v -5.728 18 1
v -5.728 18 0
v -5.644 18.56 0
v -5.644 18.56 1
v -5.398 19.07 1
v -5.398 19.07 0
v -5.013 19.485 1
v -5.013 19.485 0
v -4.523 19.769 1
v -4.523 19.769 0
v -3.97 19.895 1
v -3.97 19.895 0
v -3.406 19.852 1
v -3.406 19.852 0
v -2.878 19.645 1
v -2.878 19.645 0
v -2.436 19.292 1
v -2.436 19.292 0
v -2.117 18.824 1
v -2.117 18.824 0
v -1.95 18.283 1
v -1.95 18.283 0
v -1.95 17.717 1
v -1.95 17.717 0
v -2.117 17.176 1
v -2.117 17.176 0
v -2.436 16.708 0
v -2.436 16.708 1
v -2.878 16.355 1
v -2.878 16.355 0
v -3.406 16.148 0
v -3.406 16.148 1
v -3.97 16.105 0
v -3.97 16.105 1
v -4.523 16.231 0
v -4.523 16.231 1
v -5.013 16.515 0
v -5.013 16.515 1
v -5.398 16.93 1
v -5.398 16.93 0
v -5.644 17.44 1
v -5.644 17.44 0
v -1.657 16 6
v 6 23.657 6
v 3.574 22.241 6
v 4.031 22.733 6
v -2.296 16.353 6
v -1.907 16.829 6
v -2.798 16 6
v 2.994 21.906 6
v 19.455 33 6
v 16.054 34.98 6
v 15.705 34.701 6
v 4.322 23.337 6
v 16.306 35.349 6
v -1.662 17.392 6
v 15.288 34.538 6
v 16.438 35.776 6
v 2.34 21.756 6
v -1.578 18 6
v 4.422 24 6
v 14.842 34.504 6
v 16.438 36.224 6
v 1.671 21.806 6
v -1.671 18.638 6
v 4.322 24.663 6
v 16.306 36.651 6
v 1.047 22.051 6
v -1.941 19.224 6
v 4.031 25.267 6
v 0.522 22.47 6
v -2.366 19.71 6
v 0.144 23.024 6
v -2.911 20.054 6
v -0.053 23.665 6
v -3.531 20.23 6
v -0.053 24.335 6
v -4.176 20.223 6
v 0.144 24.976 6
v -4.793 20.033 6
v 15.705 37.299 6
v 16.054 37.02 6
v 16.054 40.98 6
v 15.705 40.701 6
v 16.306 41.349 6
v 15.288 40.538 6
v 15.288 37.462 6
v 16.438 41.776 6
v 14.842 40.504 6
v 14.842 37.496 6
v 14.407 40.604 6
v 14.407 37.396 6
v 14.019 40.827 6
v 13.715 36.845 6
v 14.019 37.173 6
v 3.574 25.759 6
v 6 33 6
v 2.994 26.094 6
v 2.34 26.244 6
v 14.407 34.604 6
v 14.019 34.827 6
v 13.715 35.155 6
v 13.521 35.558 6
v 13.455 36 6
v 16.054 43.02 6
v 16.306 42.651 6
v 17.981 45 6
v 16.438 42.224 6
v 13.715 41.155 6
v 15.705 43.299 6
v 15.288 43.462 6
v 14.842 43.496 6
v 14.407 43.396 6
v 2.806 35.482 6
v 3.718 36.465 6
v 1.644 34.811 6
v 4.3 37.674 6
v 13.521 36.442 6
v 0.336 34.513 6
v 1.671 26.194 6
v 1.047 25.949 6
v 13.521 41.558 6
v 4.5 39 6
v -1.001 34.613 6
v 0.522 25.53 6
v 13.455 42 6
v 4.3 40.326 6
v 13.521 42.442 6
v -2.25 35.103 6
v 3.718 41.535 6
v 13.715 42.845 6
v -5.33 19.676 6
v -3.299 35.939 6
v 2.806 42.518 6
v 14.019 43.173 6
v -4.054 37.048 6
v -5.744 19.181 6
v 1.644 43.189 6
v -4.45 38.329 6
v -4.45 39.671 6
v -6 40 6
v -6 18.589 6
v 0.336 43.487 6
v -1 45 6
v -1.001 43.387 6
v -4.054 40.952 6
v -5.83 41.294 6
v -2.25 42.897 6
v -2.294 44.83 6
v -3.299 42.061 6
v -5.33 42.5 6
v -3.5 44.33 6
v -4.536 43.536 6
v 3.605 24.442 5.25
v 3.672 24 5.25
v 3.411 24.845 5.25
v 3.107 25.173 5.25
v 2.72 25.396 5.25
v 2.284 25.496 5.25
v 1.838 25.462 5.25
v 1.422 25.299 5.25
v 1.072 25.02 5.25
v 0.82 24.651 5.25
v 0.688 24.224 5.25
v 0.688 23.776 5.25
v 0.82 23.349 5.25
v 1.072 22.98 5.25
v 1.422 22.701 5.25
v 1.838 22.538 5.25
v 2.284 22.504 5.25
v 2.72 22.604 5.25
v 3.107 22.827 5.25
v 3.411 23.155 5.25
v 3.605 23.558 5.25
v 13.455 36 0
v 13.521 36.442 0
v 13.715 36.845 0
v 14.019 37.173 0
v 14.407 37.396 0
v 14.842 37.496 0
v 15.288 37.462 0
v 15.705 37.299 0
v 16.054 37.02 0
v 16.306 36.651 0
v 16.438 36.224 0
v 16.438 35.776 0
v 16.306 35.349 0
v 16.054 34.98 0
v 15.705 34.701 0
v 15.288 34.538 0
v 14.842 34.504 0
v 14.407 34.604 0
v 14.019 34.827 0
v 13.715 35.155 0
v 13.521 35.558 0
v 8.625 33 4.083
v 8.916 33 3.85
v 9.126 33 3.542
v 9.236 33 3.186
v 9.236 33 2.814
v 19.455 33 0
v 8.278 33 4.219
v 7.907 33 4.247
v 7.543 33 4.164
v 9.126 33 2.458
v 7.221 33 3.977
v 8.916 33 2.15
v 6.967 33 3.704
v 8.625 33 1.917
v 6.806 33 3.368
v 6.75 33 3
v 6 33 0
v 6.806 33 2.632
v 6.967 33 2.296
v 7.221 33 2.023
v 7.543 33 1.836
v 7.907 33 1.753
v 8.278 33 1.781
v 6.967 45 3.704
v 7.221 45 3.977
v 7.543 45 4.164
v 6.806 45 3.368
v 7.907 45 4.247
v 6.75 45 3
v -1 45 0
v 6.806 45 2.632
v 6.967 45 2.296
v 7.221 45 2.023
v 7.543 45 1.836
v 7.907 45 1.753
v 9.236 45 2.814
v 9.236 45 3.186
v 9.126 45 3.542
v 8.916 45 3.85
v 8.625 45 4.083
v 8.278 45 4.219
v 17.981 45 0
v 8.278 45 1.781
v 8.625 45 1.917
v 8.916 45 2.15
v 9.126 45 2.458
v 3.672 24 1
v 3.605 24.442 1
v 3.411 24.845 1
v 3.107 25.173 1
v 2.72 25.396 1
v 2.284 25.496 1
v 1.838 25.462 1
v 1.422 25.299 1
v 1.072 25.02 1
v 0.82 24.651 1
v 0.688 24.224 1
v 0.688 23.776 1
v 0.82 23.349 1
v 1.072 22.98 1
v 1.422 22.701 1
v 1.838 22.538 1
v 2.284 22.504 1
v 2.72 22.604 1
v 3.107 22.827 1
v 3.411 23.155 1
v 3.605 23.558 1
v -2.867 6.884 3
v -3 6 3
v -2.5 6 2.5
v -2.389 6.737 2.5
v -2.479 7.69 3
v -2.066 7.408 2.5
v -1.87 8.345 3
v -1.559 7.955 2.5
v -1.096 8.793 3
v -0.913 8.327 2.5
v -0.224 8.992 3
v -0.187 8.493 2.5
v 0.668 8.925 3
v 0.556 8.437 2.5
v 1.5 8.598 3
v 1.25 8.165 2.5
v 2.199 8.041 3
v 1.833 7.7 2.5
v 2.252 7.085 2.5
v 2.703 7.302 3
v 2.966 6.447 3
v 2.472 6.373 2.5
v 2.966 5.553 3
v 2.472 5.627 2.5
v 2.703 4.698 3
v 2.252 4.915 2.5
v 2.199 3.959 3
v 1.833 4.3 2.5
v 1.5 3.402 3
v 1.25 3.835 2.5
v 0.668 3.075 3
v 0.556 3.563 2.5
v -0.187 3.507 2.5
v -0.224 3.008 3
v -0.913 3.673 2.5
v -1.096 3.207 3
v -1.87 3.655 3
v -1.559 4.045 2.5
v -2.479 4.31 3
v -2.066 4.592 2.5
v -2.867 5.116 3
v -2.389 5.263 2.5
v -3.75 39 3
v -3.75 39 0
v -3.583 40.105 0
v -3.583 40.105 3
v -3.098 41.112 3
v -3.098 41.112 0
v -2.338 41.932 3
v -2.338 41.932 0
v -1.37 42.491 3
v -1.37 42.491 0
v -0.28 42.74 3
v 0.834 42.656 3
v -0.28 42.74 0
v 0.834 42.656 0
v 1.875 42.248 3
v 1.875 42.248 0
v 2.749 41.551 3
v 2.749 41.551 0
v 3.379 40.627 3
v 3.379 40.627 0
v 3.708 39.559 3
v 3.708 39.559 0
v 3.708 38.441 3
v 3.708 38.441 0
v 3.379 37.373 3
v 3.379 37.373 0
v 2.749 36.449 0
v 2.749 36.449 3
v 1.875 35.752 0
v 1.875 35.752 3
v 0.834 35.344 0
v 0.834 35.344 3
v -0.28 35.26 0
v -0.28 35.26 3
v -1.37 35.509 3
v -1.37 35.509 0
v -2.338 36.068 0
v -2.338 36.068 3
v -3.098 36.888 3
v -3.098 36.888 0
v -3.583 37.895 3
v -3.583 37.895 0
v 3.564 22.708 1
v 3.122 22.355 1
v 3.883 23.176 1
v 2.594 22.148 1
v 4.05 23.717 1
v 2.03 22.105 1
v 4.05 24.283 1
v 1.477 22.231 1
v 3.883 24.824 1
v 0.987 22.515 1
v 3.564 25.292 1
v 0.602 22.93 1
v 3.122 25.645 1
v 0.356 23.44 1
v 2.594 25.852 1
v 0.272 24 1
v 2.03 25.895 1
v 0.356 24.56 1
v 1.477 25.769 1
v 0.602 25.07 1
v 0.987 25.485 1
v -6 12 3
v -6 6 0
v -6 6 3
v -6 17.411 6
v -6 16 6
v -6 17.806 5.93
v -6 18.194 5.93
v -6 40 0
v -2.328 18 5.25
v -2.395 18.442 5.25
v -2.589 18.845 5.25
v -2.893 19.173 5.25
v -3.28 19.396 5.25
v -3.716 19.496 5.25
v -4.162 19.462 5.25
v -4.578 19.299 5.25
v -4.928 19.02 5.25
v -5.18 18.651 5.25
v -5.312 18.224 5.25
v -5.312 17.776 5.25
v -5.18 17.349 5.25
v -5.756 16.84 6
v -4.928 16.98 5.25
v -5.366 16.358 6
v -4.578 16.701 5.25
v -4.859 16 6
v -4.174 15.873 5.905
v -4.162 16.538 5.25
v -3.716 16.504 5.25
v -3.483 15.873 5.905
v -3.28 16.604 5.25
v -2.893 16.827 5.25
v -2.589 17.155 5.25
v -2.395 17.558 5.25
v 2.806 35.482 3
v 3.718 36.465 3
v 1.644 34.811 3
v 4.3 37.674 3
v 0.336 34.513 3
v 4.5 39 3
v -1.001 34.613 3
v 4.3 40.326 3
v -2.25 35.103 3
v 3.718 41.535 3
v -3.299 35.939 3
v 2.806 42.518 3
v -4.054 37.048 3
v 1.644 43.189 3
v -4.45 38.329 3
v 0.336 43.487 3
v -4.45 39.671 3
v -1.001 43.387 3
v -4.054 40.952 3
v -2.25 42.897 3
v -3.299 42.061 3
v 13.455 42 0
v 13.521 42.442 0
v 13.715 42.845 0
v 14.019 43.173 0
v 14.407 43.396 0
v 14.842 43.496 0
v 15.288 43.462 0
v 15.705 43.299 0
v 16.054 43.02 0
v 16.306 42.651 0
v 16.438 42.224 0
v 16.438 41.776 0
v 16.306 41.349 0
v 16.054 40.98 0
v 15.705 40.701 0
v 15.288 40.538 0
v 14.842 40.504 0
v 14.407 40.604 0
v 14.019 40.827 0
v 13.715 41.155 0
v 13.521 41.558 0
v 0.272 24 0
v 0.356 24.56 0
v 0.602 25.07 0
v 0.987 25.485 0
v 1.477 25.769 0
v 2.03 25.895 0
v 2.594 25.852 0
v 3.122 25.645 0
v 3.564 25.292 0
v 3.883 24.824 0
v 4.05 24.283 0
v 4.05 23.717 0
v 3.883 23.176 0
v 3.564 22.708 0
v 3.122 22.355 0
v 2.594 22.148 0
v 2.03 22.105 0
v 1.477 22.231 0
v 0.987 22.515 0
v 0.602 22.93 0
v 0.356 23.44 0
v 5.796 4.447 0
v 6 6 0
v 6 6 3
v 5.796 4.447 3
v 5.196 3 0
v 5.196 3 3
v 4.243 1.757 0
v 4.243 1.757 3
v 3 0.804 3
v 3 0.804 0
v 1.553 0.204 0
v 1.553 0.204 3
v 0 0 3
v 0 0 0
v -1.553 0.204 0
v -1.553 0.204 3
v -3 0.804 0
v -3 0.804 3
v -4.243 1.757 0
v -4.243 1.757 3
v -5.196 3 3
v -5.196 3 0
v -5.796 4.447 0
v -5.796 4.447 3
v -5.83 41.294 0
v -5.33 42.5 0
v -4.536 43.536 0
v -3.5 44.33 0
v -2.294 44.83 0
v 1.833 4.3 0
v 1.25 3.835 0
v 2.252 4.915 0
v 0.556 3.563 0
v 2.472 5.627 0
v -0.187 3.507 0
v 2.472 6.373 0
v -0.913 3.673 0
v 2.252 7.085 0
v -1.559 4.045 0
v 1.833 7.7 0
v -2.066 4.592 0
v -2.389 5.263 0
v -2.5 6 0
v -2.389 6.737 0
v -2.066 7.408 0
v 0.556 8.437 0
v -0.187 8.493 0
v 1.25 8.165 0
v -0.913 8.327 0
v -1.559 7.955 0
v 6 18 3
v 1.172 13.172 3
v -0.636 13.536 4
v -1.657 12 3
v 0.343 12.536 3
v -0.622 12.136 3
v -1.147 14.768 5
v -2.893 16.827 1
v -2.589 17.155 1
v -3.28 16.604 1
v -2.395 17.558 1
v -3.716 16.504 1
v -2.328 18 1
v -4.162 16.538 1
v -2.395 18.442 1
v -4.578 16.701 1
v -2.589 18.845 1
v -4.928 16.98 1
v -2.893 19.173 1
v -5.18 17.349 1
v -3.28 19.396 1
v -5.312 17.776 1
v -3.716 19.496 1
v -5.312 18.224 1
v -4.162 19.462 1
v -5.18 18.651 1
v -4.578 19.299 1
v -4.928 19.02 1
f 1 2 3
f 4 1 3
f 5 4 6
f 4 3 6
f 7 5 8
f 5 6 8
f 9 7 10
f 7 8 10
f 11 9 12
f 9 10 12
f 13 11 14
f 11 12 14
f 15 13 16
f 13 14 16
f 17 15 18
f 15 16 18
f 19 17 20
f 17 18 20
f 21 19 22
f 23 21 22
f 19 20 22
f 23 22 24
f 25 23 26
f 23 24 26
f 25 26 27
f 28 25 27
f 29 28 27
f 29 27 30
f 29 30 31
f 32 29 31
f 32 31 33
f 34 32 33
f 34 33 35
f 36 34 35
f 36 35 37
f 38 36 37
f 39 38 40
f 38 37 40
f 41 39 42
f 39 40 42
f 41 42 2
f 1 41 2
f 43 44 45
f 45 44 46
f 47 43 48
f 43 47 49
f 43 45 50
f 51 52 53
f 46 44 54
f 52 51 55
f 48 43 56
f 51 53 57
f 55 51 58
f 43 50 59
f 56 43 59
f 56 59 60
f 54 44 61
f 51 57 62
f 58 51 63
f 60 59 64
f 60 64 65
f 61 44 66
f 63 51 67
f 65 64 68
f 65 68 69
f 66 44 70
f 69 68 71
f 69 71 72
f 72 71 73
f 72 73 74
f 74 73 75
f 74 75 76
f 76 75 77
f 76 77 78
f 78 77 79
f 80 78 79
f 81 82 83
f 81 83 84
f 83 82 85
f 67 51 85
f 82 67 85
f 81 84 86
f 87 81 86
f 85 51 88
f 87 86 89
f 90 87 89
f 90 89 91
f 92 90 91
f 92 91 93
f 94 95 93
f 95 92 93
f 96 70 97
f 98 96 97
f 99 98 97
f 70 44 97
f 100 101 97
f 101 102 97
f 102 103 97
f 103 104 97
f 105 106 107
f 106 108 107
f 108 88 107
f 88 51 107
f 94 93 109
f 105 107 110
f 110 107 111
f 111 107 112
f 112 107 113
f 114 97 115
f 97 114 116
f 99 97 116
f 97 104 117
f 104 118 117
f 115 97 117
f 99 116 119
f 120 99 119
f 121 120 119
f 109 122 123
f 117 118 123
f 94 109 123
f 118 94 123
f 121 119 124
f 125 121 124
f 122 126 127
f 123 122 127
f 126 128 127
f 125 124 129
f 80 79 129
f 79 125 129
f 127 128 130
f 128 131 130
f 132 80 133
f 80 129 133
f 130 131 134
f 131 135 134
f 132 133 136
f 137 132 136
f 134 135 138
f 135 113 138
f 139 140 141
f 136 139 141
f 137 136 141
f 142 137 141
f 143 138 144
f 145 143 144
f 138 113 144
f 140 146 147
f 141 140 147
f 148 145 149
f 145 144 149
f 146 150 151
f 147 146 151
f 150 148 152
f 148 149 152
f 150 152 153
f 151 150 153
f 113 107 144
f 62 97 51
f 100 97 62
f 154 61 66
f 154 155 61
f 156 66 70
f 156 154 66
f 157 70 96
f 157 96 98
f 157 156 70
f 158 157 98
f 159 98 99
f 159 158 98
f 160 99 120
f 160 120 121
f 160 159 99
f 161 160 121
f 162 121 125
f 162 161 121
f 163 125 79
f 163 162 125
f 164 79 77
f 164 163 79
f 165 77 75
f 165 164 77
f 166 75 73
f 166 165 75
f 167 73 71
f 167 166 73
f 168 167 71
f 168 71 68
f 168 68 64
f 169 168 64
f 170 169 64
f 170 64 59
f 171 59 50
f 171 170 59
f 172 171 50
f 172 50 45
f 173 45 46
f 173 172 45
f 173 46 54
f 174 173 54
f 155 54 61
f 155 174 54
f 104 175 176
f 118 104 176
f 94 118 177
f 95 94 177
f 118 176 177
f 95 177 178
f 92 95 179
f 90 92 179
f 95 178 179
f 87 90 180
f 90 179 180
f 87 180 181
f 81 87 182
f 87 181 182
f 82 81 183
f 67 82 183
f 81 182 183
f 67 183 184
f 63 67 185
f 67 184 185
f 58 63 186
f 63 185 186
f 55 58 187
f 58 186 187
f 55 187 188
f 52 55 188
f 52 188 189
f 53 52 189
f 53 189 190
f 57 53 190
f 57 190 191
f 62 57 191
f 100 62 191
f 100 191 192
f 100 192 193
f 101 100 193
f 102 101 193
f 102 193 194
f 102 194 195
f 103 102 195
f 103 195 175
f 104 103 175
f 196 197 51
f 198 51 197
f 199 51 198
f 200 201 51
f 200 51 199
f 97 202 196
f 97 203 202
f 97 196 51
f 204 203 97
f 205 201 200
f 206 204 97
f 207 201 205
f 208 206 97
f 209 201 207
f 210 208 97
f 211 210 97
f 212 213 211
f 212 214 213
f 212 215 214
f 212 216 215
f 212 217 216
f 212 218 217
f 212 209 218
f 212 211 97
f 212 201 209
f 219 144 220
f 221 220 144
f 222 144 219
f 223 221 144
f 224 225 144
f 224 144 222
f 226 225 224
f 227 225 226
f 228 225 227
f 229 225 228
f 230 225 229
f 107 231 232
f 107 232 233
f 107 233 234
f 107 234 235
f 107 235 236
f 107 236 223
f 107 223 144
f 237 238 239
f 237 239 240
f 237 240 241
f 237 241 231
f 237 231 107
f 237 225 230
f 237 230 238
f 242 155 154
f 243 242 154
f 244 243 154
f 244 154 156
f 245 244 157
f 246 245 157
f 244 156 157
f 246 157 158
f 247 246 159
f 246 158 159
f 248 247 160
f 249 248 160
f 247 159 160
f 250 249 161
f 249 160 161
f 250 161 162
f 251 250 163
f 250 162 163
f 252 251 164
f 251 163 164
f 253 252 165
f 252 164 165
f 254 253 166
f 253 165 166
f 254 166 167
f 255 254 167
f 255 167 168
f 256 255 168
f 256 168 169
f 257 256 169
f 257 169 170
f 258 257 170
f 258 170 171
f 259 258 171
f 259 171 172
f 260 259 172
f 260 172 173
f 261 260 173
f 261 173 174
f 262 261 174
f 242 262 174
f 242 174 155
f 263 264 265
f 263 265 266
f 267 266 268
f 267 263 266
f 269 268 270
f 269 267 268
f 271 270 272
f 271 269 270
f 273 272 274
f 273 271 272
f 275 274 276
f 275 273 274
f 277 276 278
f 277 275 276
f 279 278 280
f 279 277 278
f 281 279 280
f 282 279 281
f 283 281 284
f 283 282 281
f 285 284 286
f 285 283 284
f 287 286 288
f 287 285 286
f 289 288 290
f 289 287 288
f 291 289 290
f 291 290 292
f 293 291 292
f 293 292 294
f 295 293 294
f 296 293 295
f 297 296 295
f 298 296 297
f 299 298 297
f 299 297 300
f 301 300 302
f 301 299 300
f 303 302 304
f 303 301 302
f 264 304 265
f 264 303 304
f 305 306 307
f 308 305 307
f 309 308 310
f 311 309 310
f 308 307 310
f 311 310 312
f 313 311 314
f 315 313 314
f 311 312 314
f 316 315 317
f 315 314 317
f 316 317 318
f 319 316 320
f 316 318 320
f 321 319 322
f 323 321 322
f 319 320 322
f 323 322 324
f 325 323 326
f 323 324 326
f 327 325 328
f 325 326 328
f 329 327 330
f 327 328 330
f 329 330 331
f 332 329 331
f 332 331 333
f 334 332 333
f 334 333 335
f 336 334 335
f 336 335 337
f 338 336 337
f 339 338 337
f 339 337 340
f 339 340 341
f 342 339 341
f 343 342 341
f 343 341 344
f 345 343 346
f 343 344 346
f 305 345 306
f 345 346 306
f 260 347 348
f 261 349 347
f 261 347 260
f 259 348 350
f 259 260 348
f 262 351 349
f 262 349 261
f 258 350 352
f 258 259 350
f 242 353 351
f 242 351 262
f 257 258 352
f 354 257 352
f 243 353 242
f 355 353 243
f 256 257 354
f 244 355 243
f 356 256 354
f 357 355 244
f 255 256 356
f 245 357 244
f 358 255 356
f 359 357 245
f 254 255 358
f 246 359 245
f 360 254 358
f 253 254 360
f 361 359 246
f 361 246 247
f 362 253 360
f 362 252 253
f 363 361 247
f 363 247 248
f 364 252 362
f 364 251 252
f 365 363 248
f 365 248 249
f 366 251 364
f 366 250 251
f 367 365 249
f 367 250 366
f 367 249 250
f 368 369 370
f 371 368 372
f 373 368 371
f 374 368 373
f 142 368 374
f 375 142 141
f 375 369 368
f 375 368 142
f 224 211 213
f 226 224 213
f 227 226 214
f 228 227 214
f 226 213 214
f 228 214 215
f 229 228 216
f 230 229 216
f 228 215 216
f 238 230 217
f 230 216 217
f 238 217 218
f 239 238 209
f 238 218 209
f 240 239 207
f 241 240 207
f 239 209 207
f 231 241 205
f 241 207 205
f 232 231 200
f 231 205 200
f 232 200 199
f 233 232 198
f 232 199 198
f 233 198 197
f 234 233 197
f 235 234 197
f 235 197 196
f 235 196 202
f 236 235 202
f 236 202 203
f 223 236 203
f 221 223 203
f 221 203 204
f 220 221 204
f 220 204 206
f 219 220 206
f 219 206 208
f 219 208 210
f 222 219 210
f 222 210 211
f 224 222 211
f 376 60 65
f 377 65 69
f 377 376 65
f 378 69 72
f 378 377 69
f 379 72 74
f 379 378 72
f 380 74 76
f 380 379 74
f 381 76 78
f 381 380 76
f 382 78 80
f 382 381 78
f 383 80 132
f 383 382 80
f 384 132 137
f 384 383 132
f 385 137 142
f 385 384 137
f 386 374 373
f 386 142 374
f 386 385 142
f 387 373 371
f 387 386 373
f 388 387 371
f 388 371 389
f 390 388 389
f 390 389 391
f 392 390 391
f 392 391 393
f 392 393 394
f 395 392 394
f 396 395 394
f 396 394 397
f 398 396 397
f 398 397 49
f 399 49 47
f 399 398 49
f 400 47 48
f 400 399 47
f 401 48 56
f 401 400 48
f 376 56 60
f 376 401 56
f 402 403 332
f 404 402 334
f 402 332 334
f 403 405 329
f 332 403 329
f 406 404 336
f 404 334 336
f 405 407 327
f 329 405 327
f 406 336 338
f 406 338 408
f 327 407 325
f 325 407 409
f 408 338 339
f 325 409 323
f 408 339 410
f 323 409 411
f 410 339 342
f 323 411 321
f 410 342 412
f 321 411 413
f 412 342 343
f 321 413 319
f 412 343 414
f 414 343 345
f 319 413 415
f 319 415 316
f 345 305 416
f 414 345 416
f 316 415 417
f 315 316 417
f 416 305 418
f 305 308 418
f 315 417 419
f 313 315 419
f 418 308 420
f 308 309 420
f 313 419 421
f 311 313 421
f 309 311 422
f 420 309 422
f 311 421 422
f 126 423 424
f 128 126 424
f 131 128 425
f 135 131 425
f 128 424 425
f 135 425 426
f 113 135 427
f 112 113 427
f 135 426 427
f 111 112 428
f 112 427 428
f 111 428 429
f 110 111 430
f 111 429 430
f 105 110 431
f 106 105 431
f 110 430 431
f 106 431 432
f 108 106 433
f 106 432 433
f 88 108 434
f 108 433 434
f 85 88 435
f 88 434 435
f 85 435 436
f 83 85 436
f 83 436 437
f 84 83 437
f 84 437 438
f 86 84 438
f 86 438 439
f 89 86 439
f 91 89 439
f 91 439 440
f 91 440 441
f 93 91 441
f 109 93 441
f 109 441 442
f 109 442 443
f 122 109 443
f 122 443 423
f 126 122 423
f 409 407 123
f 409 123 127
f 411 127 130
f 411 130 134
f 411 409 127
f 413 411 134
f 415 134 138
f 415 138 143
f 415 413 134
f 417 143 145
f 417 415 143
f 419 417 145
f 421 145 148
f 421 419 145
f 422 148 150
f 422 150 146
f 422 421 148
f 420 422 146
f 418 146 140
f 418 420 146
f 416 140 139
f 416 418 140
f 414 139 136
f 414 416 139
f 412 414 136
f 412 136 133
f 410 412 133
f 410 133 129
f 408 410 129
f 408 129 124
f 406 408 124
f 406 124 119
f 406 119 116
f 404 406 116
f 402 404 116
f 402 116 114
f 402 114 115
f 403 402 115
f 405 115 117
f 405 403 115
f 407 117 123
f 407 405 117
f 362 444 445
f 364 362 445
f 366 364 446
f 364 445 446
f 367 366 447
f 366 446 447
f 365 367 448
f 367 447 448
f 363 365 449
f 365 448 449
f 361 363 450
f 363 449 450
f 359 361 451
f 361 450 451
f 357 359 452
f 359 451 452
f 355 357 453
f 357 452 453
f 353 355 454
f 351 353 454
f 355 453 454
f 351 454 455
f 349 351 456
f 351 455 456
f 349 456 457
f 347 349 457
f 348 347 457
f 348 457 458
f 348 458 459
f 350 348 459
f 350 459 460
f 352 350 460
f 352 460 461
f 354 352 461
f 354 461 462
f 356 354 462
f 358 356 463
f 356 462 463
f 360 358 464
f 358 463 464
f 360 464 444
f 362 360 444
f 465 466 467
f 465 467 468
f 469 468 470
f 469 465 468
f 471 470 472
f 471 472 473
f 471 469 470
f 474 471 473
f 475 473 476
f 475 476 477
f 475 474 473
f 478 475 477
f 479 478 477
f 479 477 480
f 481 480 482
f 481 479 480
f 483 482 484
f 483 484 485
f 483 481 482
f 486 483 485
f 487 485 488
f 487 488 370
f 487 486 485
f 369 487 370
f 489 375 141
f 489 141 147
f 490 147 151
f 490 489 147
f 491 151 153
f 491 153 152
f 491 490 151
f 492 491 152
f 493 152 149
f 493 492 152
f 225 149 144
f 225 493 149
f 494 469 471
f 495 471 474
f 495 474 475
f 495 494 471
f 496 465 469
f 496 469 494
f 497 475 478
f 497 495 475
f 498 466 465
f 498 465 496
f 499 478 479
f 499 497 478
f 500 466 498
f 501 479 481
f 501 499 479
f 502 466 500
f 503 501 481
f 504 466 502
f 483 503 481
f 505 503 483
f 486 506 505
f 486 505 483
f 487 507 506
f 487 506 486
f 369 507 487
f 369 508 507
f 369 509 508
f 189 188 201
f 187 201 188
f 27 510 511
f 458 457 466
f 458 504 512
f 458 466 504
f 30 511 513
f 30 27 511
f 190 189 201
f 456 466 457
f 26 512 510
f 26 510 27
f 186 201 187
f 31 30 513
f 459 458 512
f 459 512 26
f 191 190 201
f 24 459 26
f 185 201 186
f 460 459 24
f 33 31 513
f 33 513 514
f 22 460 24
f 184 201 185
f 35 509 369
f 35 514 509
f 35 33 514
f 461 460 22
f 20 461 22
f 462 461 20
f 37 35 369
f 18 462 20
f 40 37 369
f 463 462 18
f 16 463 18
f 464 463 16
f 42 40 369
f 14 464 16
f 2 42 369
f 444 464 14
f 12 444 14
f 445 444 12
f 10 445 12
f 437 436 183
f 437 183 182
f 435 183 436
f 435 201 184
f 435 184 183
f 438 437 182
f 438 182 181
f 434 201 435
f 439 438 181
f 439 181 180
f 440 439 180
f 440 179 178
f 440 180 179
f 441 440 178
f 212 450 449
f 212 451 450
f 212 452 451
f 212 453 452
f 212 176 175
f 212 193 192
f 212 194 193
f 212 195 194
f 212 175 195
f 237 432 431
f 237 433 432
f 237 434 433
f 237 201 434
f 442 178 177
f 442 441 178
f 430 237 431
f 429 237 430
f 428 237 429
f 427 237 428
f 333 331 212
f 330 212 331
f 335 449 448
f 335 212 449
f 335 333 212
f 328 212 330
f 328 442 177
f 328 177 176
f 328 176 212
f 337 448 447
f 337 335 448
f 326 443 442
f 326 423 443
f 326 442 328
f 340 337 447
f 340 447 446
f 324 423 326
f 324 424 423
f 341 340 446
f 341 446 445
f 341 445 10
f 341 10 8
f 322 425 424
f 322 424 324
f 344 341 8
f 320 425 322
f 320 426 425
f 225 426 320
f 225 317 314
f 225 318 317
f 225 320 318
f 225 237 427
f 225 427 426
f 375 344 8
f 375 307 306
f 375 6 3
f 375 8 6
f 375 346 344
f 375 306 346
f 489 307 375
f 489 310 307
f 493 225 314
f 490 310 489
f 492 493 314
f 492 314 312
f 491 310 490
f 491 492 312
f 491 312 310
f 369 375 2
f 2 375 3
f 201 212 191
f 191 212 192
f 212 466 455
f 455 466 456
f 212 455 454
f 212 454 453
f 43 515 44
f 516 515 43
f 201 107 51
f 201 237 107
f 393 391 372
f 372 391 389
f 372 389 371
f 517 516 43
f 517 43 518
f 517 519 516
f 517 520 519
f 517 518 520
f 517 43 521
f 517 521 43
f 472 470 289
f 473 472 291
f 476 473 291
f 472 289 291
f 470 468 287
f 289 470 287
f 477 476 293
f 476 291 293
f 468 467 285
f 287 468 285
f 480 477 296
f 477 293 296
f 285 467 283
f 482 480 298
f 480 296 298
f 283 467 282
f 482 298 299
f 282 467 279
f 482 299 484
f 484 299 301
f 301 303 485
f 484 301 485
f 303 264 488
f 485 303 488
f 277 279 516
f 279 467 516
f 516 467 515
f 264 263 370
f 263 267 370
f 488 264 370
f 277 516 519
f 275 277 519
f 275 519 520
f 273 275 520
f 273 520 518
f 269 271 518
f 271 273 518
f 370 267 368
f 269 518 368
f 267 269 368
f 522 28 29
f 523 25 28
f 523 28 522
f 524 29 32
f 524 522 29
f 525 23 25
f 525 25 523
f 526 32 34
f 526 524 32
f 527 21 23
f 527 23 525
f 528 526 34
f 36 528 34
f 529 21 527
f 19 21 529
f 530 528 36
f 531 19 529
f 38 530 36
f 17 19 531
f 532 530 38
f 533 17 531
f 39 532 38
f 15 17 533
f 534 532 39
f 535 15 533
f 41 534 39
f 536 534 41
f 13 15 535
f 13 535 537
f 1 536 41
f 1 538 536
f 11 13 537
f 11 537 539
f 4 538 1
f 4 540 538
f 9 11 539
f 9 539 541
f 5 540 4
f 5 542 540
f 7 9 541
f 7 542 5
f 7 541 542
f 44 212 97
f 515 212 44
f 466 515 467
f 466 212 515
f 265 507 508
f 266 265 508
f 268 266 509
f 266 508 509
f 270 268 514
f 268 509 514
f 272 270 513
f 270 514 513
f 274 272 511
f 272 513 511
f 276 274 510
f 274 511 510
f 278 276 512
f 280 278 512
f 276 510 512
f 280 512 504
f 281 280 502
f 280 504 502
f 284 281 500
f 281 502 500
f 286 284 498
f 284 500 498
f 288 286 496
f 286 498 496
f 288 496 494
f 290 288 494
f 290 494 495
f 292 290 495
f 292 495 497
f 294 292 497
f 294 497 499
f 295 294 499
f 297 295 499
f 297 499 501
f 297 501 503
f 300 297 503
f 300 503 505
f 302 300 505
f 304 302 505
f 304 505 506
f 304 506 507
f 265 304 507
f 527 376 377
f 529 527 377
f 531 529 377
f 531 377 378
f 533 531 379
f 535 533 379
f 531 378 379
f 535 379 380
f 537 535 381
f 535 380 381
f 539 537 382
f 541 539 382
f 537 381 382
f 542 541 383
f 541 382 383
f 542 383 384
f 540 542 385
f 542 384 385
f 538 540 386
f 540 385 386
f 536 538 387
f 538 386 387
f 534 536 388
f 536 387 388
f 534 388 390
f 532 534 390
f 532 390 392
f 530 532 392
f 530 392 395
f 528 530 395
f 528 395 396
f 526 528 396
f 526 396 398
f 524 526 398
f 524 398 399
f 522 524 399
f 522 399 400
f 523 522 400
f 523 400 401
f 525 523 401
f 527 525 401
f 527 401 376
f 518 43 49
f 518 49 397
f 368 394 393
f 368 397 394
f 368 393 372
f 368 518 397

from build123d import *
from OCP.BRepFilletAPI import BRepFilletAPI_MakeChamfer

# Parameters (mm, degrees)
ESBO_O1_R                 = 4.5
RESSALTO_EXTRUS_O1_DEPTH  = 3
ESBO_O2_R                 = 4.5
RESSALTO_EXTRUS_O2_DEPTH  = 3
CHANFRO1_SIZE             = 4
CHANFRO1_SIZE_2           = 3
FURO_ROSCADO_DE_M3X0_51_D = 2.5
ESBO_O6_R                 = 4.5
ESBO_O6_R_2               = 3.75
RESSALTO_EXTRUS_O3_DEPTH  = 3
CORTE_EXTRUS_O1_REACH     = 51.391
ESBO_O7_R                 = 1.5
CORTE_EXTRUS_O2_REACH     = 51.391
ESBO_O8_R                 = 1.5
CHANFRO2_SIZE             = 0.75
CORTE_EXTRUS_O4_REACH     = 51.391
ESBO_O14_R                = 2.5
CHANFRO3_SIZE             = 0.5
ESBO_O15_R                = 1.9
CORTE_EXTRUS_O5_DEPTH     = 1


# Some blends are built 0.0001 mm under size
with BuildPart() as part:
    # Esboço1 → Ressalto-extrusão1 (new body)
    with BuildSketch(Plane.XY):
        with BuildLine():
            Line((-6, 6), (-6, 39))
            Line((-6, 39), (-6, 40))
            ThreePointArc((-6, 40), (-4.535533906, 43.535533906), (-1, 45))
            Line((-1, 45), (17.98112418, 45))
            Line((17.98112418, 45), (19.454538911, 33))
            Line((19.454538911, 33), (17.98112418, 33))
            Line((17.98112418, 33), (6, 33))
            Line((6, 33), (6, 25))
            Line((6, 25), (6, 6))
            ThreePointArc((6, 6), (4.242640687, 1.757359313), (0, 0))
            ThreePointArc((0, 0), (-4.242640687, 1.757359313), (-6, 6))
        make_face()
        with Locations((0, 39)):
            Circle(ESBO_O1_R, mode=Mode.SUBTRACT)
    extrude(amount=RESSALTO_EXTRUS_O1_DEPTH)

    # Esboço2 → Ressalto-extrusão2 (add)
    with BuildSketch(Plane.XY.offset(3)):
        with BuildLine():
            Line((6, 25), (6, 18))
            Line((6, 18), (1.171572875, 13.171572875))
            ThreePointArc((1.171572875, 13.171572875), (-0.12612052, 12.30448187), (-1.656854249, 12))
            Line((-1.656854249, 12), (-6, 12))
            Line((-6, 12), (-6, 25))
            Line((-6, 25), (-6, 40))
            ThreePointArc((-6, 40), (-4.535533906, 43.535533906), (-1, 45))
            Line((-1, 45), (17.98112418, 45))
            Line((17.98112418, 45), (19.454538911, 33))
            Line((19.454538911, 33), (6, 33))
            Line((6, 33), (6, 25))
        make_face()
        with Locations((0, 39)):
            Circle(ESBO_O2_R, mode=Mode.SUBTRACT)
    extrude(amount=RESSALTO_EXTRUS_O2_DEPTH)

    # Chanfro1
    chanfro1_edges_1 = [part.edges().sort_by_distance(p)[0] for p in [
        (3.585786438, 15.585786438, 6),
    ]]
    chanfro1_side_1 = [part.faces().sort_by_distance(p)[0] for p in [
        (3.543360031, 15.628212844, 6),
    ]]
    chanfro1_edges_2 = [part.edges().sort_by_distance(p)[0] for p in [
        (-0.12612052, 12.30448187, 6),
    ]]
    chanfro1_side_2 = [part.faces().sort_by_distance(p)[0] for p in [
        (-0.149081526, 12.359914642, 6),
    ]]
    chanfro1_edges_3 = [part.edges().sort_by_distance(p)[0] for p in [
        (-3.828427125, 12, 6),
    ]]
    chanfro1_side_3 = [part.faces().sort_by_distance(p)[0] for p in [
        (-3.828427125, 12, 5.94),
    ]]
    chanfro1 = BRepFilletAPI_MakeChamfer(part.part.solid().wrapped)
    for e in chanfro1_edges_1:
        chanfro1.Add(CHANFRO1_SIZE - 0.0001, CHANFRO1_SIZE_2 - 0.0001, e.wrapped, chanfro1_side_1[0].wrapped)
    for e in chanfro1_edges_2:
        chanfro1.Add(CHANFRO1_SIZE - 0.0001, CHANFRO1_SIZE_2 - 0.0001, e.wrapped, chanfro1_side_2[0].wrapped)
    for e in chanfro1_edges_3:
        chanfro1.Add(CHANFRO1_SIZE_2 - 0.0001, CHANFRO1_SIZE - 0.0001, e.wrapped, chanfro1_side_3[0].wrapped)
    add(Compound.cast(chanfro1.Shape()), mode=Mode.REPLACE)  # a hair under: the kernel refuses the full size

    # Furo roscado de M3x0.51 (through all)
    with Locations(Plane(origin=(0, 45, 0), x_dir=(1, 0, 0), z_dir=(0, 1, 0))):
        with Locations((8, -3)):
            Hole(FURO_ROSCADO_DE_M3X0_51_D / 2)

    # Esboço6 → Ressalto-extrusão3 (add)
    with BuildSketch(Plane(origin=(0, 0, 0), x_dir=(-1, 0, 0), z_dir=(0, 0, -1))):
        with Locations((0, 39)):
            Circle(ESBO_O6_R)
        with Locations((0, 39)):
            Circle(ESBO_O6_R_2, mode=Mode.SUBTRACT)
    extrude(amount=-RESSALTO_EXTRUS_O3_DEPTH)

    # Esboço7 → Corte-extrusão1 (cut, up to next)
    with BuildSketch(Plane(origin=(0, 0, 0), x_dir=(-1, 0, 0), z_dir=(0, 0, -1)), mode=Mode.PRIVATE) as corte_extrus_o1_sk1:
        with Locations((-14.954538911, 42)):
            Circle(ESBO_O7_R)
    corte_extrus_o1_tool1 = extrude(corte_extrus_o1_sk1.sketch, amount=-CORTE_EXTRUS_O1_REACH, mode=Mode.PRIVATE) & part.part
    # Esboço7 → Corte-extrusão1 (cut, up to next)
    with BuildSketch(Plane(origin=(0, 0, 0), x_dir=(-1, 0, 0), z_dir=(0, 0, -1)), mode=Mode.PRIVATE) as corte_extrus_o1_sk2:
        with Locations((-14.954538911, 36)):
            Circle(ESBO_O7_R)
    corte_extrus_o1_tool2 = extrude(corte_extrus_o1_sk2.sketch, amount=-CORTE_EXTRUS_O1_REACH, mode=Mode.PRIVATE) & part.part
    add(corte_extrus_o1_tool1.solids().sort_by_distance((14.954539, 42, 0))[0], mode=Mode.SUBTRACT)
    add(corte_extrus_o1_tool2.solids().sort_by_distance((14.954539, 36, 0))[0], mode=Mode.SUBTRACT)

    # Esboço8 → Corte-extrusão2 (cut, up to next)
    with BuildSketch(Plane.XY.offset(6), mode=Mode.PRIVATE) as corte_extrus_o2_sk1:
        with Locations((2.171572875, 24)):
            Circle(ESBO_O8_R)
    corte_extrus_o2_tool1 = extrude(corte_extrus_o2_sk1.sketch, amount=-CORTE_EXTRUS_O2_REACH, mode=Mode.PRIVATE) & part.part
    # Esboço8 → Corte-extrusão2 (cut, up to next)
    with BuildSketch(Plane.XY.offset(6), mode=Mode.PRIVATE) as corte_extrus_o2_sk2:
        with Locations((-3.828427125, 18)):
            Circle(ESBO_O8_R)
    corte_extrus_o2_tool2 = extrude(corte_extrus_o2_sk2.sketch, amount=-CORTE_EXTRUS_O2_REACH, mode=Mode.PRIVATE) & part.part
    add(corte_extrus_o2_tool1.solids().sort_by_distance((2.171573, 24, 6))[0], mode=Mode.SUBTRACT)
    add(corte_extrus_o2_tool2.solids().sort_by_distance((-3.828427, 18, 6))[0], mode=Mode.SUBTRACT)

    # Chanfro2
    # the kernel refuses this chamfer: 0.75 mm, written as the material it takes off along each edge
    with BuildSketch(Plane(origin=(2.171572875, 24, 6), x_dir=(1, 0, 0), z_dir=(0, -1, 0))) as chanfro2_piece_1:
        Polygon((1.5 + CHANFRO2_SIZE, 0), (1.5, -CHANFRO2_SIZE), (1.5, 0), align=None)
    revolve(axis=Axis((2.171572875, 24, 6), (0, 0, 1)), mode=Mode.SUBTRACT)
    with BuildSketch(Plane(origin=(-3.828427125, 18, 6), x_dir=(1, 0, 0), z_dir=(0, -1, 0))) as chanfro2_piece_2:
        Polygon((1.5 + CHANFRO2_SIZE, 0), (1.5, -CHANFRO2_SIZE), (1.5, 0), align=None)
    revolve(axis=Axis((-3.828427125, 18, 6), (0, 0, 1)), mode=Mode.SUBTRACT)

    # Esboço14 → Corte-extrusão4 (cut, up to next)
    with BuildSketch(Plane(origin=(0, 0, 0), x_dir=(-1, 0, 0), z_dir=(0, 0, -1)), mode=Mode.PRIVATE) as corte_extrus_o4_sk1:
        with Locations((0, 6)):
            Circle(ESBO_O14_R)
    corte_extrus_o4_tool1 = extrude(corte_extrus_o4_sk1.sketch, amount=-CORTE_EXTRUS_O4_REACH, mode=Mode.PRIVATE) & part.part
    add(corte_extrus_o4_tool1.solids().sort_by_distance((0, 6, 0))[0], mode=Mode.SUBTRACT)

    # Chanfro3
    chanfro3_edges = [part.edges().sort_by_distance(p)[0] for p in [
        (2.5, 6, 3),
    ]]
    chamfer(chanfro3_edges, length=CHANFRO3_SIZE)

    # Esboço15 → Corte-extrusão5 (cut)
    with BuildSketch(Plane(origin=(0, 0, 0), x_dir=(-1, 0, 0), z_dir=(0, 0, -1))):
        with Locations((-2.171572875, 24)):
            Circle(ESBO_O15_R)
        with Locations((3.828427125, 18)):
            Circle(ESBO_O15_R)
    extrude(amount=-CORTE_EXTRUS_O5_DEPTH, mode=Mode.SUBTRACT)


solid = part.part
